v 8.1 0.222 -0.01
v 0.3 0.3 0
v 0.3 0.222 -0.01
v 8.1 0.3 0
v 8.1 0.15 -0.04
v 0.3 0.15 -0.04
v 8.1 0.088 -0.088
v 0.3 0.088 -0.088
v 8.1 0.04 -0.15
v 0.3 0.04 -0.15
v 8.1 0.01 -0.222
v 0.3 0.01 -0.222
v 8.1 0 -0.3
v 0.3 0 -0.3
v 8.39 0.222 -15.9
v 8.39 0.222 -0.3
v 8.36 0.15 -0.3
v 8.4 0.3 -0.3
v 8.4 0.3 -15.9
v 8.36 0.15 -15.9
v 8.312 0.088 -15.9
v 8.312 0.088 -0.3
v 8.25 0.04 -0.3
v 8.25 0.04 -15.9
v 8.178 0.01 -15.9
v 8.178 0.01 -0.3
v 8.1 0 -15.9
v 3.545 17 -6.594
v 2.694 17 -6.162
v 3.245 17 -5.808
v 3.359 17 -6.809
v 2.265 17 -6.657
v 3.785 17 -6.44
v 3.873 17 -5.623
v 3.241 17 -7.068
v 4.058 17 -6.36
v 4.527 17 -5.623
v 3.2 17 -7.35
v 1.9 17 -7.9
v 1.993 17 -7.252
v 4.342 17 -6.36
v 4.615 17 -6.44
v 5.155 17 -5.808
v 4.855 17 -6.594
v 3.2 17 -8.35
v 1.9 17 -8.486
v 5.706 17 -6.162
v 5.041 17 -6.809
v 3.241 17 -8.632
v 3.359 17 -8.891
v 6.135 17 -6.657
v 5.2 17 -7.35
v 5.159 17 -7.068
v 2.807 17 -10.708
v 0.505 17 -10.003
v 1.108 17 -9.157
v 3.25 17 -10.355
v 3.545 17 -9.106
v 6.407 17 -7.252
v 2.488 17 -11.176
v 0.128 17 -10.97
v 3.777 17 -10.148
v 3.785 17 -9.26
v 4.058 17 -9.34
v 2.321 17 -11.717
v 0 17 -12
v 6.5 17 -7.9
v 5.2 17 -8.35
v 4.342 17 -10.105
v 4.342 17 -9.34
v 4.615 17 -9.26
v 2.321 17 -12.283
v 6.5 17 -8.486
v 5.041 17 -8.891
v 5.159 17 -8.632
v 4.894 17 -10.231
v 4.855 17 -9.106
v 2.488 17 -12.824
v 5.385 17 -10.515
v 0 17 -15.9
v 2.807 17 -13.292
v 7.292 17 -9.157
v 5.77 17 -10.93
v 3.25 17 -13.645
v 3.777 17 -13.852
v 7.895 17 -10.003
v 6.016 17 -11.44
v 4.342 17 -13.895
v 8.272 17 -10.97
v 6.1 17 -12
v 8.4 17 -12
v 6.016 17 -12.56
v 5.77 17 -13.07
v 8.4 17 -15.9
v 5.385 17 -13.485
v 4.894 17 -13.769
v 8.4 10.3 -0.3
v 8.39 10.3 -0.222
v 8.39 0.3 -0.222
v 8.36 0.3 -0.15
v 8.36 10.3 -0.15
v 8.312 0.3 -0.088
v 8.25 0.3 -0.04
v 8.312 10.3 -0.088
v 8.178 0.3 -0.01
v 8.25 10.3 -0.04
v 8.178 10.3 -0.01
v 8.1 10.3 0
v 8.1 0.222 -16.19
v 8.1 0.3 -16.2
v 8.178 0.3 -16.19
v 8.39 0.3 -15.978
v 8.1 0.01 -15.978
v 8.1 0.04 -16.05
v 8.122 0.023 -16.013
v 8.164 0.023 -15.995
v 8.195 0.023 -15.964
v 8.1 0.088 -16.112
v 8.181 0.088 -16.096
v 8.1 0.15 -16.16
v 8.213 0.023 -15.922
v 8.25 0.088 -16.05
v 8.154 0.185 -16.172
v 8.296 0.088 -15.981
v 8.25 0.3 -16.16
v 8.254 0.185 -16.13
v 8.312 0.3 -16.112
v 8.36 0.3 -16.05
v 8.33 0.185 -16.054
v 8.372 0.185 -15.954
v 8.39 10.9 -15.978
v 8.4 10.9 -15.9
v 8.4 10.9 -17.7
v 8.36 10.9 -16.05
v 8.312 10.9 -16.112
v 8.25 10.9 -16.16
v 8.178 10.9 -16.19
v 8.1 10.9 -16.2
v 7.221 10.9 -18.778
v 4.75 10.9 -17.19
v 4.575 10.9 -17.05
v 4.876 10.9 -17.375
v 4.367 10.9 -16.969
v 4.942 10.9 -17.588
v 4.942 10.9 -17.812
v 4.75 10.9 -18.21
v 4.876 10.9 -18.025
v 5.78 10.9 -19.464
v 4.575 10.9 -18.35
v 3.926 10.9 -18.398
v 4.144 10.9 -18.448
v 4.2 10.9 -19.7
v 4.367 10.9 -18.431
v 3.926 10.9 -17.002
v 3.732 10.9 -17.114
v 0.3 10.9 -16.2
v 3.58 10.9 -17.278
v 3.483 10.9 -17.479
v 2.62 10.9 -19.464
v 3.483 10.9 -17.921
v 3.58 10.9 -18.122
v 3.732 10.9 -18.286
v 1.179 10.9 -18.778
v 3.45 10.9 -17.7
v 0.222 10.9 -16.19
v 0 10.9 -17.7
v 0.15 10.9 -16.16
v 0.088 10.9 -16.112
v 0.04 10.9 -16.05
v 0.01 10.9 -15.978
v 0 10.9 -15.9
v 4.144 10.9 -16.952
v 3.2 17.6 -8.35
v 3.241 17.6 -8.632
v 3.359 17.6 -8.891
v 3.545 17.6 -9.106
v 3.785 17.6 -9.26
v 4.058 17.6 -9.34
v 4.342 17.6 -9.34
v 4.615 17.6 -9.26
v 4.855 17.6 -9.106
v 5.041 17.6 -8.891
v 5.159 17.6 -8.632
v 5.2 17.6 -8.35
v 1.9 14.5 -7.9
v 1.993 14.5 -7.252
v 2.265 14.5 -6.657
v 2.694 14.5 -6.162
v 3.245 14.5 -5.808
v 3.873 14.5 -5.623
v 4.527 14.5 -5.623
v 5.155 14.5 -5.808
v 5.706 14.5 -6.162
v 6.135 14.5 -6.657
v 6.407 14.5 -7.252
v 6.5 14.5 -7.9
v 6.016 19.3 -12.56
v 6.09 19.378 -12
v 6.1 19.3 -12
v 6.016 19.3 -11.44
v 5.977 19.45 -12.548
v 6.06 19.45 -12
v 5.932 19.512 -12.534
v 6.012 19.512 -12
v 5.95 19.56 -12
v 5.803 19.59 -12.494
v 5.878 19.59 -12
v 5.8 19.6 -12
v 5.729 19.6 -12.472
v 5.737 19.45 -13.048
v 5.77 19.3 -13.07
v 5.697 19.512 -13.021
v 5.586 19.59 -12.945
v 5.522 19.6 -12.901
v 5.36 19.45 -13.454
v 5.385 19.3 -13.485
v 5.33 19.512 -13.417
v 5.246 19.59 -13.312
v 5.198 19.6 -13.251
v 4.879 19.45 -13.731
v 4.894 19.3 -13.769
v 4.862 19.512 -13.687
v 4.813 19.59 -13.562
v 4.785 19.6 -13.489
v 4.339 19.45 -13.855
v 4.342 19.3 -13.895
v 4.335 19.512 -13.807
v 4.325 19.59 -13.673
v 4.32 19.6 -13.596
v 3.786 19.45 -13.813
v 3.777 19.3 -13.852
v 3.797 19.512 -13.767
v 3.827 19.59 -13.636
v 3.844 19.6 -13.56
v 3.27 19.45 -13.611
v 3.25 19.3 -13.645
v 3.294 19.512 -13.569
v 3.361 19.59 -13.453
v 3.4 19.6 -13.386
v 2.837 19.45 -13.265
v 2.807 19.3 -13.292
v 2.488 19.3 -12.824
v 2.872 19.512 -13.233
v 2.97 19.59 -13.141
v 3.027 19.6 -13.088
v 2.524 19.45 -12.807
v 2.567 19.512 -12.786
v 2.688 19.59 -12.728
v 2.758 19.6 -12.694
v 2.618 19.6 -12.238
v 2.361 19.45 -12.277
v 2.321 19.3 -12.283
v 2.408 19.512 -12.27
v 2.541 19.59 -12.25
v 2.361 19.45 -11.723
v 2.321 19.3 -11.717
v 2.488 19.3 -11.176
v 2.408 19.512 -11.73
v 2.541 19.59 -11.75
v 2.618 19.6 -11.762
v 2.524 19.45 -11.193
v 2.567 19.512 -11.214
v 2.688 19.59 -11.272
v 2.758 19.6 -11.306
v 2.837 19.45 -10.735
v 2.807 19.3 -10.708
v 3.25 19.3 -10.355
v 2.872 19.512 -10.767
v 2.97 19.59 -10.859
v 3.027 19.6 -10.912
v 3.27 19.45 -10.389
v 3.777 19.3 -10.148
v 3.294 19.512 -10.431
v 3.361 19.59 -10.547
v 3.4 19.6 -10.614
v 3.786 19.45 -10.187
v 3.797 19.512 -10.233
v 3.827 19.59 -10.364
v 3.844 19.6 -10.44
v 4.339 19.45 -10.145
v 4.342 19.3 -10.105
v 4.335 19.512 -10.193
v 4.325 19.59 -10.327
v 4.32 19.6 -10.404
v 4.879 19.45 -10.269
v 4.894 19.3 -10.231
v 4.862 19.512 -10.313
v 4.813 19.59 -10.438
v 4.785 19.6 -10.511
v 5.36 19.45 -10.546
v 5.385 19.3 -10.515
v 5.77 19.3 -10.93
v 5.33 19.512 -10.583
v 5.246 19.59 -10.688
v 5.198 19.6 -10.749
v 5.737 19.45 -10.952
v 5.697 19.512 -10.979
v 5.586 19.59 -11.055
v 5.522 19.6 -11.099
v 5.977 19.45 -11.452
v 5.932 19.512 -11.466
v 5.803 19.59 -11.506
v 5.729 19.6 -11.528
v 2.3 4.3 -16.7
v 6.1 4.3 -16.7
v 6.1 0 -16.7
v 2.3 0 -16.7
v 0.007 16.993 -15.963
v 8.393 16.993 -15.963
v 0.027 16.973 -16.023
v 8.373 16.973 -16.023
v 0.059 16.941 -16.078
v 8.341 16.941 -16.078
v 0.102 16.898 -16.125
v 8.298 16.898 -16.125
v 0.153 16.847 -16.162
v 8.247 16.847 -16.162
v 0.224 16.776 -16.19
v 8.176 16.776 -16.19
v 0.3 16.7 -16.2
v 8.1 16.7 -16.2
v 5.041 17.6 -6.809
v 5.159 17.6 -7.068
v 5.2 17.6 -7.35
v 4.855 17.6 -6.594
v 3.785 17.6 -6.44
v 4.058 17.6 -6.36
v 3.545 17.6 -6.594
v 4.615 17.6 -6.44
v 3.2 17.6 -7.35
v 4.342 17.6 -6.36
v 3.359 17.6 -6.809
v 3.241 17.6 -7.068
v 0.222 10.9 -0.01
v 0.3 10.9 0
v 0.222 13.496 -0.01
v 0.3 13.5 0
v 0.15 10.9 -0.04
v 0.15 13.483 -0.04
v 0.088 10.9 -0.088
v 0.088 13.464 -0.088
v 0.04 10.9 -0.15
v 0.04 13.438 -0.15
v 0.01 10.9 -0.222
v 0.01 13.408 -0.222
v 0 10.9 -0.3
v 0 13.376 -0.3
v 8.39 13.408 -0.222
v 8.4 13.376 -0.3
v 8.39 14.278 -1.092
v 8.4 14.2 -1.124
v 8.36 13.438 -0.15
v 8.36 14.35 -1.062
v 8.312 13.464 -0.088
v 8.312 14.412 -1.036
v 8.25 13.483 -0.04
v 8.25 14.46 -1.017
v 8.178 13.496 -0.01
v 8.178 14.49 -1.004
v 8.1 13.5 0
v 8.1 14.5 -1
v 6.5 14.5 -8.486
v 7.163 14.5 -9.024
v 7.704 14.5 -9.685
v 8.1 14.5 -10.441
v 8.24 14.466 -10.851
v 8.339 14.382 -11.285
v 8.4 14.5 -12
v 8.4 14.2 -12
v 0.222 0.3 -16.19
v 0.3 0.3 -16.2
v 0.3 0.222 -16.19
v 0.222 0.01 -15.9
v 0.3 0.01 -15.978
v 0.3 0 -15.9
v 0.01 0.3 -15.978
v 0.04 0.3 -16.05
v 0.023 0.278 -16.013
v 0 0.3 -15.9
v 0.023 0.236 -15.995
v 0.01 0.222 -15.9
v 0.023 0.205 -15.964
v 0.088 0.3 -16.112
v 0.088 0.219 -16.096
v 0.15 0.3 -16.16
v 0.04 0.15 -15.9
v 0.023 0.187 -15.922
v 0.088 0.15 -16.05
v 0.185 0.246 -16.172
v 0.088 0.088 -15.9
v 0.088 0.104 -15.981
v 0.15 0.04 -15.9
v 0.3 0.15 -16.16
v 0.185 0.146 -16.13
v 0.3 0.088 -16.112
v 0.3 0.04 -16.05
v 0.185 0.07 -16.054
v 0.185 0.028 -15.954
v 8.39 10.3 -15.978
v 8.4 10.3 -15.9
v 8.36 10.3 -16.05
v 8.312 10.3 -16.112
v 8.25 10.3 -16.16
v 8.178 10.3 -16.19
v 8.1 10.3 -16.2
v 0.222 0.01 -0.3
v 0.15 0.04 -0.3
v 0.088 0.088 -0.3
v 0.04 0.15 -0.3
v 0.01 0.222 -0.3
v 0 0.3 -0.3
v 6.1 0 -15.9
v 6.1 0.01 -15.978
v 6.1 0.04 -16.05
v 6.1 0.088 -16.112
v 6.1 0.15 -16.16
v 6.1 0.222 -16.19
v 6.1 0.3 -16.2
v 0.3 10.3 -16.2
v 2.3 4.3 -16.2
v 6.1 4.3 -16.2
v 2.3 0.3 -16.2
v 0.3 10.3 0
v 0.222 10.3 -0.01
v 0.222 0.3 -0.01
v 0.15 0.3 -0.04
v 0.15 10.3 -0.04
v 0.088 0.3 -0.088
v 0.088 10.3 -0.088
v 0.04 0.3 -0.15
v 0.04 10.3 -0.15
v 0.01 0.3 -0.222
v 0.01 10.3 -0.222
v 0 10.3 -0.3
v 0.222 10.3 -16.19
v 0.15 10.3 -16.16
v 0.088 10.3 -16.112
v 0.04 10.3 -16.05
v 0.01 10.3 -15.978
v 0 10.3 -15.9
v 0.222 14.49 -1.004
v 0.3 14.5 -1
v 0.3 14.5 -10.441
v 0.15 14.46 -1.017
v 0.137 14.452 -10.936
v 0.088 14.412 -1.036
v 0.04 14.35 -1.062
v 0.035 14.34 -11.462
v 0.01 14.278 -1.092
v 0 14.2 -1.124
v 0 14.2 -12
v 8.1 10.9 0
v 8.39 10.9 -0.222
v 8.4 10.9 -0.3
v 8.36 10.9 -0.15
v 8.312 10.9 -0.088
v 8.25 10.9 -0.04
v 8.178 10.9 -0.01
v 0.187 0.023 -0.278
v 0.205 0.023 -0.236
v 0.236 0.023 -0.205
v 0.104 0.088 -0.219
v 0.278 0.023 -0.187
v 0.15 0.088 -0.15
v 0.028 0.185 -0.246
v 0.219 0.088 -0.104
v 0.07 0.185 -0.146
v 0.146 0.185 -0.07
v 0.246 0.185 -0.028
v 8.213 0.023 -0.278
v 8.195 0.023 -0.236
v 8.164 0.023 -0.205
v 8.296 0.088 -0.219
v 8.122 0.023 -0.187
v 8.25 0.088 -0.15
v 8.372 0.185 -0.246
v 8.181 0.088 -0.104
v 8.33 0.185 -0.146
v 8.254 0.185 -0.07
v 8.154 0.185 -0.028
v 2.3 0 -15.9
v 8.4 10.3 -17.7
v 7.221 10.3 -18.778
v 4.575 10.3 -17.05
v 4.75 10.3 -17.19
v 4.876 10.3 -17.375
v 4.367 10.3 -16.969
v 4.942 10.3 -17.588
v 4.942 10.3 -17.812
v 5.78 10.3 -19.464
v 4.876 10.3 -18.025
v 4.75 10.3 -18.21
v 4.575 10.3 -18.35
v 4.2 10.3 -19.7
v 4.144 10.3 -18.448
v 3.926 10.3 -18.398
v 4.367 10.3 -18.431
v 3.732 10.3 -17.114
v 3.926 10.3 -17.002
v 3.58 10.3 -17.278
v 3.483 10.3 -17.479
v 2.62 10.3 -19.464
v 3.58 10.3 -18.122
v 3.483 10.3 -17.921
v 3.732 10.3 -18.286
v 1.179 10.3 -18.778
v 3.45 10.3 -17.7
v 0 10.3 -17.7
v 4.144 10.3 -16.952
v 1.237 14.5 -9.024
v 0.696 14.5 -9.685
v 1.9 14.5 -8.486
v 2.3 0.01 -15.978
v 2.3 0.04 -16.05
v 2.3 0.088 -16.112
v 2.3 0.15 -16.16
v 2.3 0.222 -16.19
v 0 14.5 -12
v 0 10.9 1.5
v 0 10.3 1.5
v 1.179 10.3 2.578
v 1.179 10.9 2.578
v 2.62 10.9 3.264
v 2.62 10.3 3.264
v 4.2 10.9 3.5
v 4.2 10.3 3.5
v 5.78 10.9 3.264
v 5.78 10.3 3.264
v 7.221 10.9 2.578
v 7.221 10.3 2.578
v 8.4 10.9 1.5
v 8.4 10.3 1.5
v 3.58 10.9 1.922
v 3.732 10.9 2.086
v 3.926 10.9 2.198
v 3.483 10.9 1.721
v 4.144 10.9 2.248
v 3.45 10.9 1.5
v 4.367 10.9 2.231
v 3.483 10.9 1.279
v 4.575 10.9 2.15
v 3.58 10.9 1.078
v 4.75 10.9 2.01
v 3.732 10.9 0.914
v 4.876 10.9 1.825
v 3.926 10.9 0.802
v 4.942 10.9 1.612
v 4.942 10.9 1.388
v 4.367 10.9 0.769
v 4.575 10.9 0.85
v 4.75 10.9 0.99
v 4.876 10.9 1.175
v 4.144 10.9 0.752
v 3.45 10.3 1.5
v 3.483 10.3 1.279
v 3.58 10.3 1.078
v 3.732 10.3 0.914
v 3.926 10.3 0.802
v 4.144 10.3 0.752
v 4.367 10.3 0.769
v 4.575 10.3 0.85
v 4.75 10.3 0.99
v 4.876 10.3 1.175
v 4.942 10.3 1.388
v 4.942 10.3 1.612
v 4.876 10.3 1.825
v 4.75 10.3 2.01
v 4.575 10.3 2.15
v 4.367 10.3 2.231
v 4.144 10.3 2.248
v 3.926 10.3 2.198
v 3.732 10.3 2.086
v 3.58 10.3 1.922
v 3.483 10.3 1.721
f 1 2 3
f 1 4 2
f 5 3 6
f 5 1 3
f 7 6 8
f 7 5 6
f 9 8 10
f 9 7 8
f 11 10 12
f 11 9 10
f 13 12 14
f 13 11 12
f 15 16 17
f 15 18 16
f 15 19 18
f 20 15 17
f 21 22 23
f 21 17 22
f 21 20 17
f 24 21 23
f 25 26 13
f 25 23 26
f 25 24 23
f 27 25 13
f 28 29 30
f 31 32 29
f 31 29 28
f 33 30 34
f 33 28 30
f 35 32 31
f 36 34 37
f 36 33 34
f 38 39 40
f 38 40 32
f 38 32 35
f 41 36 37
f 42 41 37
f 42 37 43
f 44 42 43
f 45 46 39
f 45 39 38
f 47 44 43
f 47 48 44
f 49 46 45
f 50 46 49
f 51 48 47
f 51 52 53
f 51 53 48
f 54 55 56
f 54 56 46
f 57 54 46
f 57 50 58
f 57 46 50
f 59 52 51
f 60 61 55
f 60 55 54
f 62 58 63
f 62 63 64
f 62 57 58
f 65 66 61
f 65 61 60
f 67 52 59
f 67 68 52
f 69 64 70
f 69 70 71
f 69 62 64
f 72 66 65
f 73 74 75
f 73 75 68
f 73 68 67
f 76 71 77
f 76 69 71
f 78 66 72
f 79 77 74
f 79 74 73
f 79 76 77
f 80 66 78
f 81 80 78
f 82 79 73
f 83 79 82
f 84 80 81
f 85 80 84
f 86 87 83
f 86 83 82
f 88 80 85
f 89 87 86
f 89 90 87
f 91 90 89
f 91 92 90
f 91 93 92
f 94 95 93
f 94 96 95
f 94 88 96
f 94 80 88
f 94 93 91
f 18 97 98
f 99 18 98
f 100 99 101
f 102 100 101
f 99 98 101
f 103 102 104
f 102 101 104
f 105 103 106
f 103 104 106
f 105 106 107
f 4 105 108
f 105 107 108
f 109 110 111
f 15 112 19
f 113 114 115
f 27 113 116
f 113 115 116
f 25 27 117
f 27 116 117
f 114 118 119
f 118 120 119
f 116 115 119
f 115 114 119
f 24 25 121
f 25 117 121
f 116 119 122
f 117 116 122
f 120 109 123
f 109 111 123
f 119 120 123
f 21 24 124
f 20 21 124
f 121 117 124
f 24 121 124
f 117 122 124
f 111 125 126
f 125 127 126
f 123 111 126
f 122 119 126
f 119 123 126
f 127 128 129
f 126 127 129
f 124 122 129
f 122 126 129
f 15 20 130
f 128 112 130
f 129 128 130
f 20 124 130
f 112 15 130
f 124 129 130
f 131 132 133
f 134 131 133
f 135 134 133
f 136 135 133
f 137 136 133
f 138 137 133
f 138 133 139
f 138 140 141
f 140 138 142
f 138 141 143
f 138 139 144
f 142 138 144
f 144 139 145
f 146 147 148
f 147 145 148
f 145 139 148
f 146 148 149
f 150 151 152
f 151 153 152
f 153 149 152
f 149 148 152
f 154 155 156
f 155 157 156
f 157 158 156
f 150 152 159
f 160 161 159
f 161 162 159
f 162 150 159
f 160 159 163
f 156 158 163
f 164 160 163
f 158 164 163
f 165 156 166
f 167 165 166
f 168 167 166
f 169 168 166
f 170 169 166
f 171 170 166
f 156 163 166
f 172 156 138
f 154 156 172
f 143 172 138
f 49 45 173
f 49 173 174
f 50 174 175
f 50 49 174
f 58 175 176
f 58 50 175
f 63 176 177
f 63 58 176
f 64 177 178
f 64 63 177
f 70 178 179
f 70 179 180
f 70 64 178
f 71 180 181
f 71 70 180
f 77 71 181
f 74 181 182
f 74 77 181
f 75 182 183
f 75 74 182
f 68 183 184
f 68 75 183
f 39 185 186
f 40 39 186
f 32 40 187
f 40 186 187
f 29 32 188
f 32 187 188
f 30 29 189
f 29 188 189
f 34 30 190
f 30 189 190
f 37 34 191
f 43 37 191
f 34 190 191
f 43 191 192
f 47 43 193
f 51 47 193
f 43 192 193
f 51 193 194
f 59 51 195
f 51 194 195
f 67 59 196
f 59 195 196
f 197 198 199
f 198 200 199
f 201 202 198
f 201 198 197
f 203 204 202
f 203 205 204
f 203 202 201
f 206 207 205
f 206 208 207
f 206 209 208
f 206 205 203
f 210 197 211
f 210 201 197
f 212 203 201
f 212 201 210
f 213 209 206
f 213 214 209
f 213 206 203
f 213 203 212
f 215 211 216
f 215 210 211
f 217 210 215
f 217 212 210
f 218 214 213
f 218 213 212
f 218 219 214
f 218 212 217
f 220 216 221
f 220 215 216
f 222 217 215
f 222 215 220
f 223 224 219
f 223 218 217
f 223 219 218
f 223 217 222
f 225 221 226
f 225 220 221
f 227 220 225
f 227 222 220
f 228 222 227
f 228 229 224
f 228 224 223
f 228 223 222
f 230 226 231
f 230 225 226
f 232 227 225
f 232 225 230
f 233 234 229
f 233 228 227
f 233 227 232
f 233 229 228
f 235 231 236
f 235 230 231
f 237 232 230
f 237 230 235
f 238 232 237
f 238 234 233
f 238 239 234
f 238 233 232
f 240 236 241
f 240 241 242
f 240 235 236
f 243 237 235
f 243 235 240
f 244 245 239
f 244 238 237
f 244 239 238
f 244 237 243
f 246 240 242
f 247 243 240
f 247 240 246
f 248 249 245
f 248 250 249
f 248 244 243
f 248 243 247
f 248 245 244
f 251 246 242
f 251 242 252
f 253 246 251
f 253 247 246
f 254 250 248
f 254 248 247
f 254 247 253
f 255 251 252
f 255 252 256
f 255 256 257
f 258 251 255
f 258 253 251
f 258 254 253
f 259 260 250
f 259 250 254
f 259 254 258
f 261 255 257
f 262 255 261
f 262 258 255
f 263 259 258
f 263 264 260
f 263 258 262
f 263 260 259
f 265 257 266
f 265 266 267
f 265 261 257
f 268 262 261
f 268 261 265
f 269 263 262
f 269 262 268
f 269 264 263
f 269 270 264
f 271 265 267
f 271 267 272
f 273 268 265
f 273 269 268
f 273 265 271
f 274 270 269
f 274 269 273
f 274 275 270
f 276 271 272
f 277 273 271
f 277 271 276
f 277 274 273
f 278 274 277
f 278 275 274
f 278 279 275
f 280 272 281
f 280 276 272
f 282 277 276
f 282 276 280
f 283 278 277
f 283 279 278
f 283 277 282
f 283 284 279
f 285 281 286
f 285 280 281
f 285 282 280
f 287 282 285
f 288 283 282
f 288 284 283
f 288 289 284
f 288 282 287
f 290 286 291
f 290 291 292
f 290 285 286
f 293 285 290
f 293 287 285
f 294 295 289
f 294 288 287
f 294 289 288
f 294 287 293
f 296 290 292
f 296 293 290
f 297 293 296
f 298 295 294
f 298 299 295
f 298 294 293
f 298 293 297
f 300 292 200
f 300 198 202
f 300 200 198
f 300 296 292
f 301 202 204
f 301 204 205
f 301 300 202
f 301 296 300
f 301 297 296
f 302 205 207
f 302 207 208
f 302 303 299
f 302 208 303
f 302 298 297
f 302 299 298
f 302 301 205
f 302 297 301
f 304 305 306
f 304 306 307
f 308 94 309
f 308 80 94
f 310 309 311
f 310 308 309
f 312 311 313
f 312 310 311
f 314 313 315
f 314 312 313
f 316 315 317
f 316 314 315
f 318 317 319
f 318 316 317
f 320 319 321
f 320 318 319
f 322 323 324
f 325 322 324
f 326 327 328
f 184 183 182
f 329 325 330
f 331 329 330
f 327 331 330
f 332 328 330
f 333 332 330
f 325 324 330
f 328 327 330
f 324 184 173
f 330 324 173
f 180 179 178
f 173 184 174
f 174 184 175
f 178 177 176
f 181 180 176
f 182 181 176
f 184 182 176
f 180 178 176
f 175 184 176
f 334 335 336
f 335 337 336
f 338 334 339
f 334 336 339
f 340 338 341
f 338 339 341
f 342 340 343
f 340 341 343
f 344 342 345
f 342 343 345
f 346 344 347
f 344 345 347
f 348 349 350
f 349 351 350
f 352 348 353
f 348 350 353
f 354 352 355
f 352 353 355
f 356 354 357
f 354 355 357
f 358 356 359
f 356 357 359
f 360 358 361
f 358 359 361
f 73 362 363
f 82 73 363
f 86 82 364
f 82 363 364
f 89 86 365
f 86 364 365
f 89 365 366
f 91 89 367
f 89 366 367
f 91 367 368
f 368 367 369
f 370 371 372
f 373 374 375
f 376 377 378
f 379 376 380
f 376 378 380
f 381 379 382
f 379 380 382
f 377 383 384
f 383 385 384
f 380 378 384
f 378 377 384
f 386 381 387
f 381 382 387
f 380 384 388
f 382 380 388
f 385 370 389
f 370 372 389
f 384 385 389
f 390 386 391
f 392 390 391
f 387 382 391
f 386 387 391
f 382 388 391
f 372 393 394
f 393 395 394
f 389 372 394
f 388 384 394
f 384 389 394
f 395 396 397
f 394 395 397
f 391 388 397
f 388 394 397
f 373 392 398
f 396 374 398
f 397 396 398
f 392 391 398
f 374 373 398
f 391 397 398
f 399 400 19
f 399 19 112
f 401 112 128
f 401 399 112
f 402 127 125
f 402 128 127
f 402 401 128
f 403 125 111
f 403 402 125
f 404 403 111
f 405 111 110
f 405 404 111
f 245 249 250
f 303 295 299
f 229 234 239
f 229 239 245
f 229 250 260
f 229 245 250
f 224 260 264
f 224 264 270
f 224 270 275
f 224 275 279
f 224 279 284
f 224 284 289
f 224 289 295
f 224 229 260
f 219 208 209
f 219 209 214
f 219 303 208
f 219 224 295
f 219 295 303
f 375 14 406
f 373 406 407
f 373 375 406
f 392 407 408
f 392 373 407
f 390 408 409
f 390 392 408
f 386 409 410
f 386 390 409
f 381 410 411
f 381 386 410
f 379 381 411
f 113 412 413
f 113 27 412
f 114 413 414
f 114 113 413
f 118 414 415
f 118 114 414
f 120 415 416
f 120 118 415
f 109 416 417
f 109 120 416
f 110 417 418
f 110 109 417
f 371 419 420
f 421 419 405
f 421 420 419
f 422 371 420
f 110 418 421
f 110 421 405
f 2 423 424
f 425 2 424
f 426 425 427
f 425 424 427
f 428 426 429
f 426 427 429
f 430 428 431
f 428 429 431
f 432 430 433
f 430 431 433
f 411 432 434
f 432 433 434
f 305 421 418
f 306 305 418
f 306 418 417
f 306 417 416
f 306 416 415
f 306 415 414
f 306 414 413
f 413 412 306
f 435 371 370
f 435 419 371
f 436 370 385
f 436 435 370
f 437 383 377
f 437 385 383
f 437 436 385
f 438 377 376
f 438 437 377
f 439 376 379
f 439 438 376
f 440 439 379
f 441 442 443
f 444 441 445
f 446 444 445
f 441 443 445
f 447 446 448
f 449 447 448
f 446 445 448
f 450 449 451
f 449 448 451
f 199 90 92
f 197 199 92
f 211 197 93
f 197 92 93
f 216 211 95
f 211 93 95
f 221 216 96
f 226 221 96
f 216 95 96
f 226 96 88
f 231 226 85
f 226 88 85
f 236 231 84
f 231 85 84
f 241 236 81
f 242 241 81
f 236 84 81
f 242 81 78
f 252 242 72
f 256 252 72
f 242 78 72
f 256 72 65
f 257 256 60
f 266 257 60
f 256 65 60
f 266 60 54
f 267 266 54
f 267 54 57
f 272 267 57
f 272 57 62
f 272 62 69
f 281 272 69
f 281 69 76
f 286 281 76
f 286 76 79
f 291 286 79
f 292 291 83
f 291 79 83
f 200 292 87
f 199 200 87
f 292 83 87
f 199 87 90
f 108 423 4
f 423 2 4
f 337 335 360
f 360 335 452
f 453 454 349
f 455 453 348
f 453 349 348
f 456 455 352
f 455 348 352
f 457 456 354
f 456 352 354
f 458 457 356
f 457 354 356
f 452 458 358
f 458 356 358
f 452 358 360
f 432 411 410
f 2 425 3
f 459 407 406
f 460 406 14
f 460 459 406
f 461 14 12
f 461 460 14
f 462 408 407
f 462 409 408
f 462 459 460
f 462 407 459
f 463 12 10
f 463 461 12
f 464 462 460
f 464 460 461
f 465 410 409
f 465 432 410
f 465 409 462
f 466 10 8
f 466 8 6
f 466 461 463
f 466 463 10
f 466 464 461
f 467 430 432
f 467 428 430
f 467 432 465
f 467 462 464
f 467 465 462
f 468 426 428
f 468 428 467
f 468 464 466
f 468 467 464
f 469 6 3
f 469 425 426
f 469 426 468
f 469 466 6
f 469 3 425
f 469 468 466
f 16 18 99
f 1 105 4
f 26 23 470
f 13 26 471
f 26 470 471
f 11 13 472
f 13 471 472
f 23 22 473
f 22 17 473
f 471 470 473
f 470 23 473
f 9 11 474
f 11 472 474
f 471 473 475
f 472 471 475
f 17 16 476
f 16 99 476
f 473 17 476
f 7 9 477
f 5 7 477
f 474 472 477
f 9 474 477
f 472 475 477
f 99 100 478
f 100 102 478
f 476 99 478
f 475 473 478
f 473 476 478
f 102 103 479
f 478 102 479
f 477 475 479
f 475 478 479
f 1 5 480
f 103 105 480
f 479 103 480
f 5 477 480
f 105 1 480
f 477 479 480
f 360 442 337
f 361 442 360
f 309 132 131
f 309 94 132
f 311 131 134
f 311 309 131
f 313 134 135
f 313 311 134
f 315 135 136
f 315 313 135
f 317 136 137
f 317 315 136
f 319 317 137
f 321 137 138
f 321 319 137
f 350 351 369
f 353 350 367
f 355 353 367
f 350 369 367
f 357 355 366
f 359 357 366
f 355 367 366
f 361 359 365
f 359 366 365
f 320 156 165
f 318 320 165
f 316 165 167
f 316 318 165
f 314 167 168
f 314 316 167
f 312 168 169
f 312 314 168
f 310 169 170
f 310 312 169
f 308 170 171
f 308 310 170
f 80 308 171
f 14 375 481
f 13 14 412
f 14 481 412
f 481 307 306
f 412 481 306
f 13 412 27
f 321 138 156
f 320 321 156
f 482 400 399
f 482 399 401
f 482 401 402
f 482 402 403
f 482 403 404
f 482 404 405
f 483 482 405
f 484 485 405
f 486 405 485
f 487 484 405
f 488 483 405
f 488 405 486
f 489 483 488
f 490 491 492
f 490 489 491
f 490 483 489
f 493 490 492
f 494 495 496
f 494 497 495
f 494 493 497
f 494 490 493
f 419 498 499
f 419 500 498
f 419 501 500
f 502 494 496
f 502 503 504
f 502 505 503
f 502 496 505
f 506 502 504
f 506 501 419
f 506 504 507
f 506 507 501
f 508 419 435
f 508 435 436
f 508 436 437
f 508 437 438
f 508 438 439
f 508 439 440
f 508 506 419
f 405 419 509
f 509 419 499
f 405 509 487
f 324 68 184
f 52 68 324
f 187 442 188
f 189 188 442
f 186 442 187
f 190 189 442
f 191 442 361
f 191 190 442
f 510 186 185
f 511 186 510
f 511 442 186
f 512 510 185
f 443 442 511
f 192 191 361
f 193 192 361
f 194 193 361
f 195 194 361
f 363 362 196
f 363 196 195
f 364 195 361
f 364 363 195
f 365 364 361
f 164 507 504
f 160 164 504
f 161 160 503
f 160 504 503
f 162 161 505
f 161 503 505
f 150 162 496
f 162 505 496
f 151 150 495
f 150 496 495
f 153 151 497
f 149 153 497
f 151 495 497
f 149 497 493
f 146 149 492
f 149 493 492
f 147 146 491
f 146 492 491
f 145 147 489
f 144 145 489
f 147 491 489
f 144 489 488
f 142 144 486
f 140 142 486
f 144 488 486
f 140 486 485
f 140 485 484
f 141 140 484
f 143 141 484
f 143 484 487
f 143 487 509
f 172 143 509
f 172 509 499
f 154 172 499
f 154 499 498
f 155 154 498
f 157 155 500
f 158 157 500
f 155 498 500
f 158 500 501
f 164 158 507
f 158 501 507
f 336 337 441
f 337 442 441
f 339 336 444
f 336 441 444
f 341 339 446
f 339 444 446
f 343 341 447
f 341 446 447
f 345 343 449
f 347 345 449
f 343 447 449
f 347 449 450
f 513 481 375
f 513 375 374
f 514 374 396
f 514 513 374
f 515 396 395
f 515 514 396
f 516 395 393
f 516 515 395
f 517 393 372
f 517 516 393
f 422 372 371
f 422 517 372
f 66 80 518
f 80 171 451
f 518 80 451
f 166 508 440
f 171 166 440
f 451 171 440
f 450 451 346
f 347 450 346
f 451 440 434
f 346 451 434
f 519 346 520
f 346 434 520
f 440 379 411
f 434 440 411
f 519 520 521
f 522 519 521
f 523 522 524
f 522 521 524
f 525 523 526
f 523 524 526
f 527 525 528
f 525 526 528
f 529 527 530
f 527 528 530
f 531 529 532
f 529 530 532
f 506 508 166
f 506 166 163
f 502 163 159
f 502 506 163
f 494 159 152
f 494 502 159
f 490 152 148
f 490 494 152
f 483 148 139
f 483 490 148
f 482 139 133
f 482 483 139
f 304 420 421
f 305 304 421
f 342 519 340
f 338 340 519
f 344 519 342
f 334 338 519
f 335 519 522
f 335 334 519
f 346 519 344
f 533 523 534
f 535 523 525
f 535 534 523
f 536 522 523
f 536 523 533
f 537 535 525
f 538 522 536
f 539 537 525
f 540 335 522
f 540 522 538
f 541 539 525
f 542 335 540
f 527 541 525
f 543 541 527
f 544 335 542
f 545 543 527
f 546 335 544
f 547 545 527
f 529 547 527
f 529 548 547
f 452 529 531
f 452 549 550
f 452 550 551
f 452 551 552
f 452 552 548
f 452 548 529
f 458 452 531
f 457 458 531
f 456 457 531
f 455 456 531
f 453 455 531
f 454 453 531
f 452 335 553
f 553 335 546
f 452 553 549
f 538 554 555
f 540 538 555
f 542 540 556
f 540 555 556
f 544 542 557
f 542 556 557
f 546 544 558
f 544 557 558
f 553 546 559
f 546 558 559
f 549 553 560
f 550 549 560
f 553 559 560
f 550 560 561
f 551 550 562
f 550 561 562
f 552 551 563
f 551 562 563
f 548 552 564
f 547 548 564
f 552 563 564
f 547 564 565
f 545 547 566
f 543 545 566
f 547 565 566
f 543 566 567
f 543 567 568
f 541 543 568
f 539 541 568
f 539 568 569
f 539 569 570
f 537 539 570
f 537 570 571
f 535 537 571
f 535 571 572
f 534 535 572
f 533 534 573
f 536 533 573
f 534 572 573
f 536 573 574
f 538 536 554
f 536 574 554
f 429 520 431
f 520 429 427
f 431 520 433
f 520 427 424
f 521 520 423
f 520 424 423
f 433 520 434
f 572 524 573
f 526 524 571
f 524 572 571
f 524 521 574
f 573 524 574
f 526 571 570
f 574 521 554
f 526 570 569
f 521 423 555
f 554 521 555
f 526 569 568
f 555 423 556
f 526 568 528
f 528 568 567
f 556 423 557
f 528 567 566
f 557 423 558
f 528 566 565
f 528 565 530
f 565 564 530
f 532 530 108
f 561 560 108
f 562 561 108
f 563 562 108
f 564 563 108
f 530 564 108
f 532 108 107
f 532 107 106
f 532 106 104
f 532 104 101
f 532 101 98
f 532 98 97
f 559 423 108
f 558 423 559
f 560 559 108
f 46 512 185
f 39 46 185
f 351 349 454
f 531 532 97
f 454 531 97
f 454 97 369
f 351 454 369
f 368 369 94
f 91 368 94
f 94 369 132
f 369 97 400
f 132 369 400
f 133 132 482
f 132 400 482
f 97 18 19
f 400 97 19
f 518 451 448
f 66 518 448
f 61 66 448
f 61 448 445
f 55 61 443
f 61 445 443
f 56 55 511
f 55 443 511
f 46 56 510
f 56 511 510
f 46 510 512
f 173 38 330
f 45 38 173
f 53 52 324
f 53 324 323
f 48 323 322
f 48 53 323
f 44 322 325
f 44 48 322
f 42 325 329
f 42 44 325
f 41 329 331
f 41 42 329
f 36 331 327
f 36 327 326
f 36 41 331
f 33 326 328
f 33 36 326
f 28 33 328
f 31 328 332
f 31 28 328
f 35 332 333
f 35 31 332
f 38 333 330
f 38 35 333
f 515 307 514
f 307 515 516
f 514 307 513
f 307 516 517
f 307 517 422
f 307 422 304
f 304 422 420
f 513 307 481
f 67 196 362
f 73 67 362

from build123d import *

# Parameters (mm, degrees)
SKETCH_1_W      = 8.4
SKETCH_1_H      = 16.2
EXTRUDE_1_DEPTH = 14.5
SKETCH_3_R      = 0.75
EXTRUDE_2_DEPTH = 0.6
EXTRUDE_3_DEPTH = 2.5
SKETCH_5_R      = 1.9
EXTRUDE_4_DEPTH = 2.6
EXTRUDE_5_DEPTH = 0.6
EXTRUDE_6_DEPTH = 0.5
CHAMFER_1_SIZE  = 1
FILLET_1_R      = 0.3


with BuildPart() as part:
    # 草图1 → 凸台-拉伸1 (new body)
    with BuildSketch(Plane(origin=(0, 0, 0), x_dir=(1, 0, 0), z_dir=(0, 1, 0))):
        with Locations((4.2, 8.1)):
            Rectangle(SKETCH_1_W, SKETCH_1_H)
    extrude(amount=EXTRUDE_1_DEPTH)

    # 草图3 → 凸台-拉伸2 (add)
    with BuildSketch(Plane(origin=(0, 10.3, 0), x_dir=(-1, 0, 0), z_dir=(0, -1, 0))):
        with BuildLine():
            Line((0, 16.2), (0, 17.7))
            ThreePointArc((0, 17.7), (-4.2, 19.7), (-8.4, 17.7))
            Line((-8.4, 17.7), (-8.4, 16.2))
            Line((-8.4, 16.2), (0, 16.2))
        make_face()
        with Locations((-4.2, 17.7)):
            Circle(SKETCH_3_R, mode=Mode.SUBTRACT)
        with BuildLine():
            Line((-8.4, 0), (0, 0))
            Line((0, 0), (0, -1.5))
            ThreePointArc((0, -1.5), (-4.2, -3.5), (-8.4, -1.5))
            Line((-8.4, -1.5), (-8.4, 0))
        make_face()
        with Locations((-4.2, -1.5)):
            Circle(SKETCH_3_R, mode=Mode.SUBTRACT)
    extrude(amount=-EXTRUDE_2_DEPTH)

    # 草图4 → 凸台-拉伸3 (add)
    with BuildSketch(Plane(origin=(0, 14.5, 0), x_dir=(1, 0, 0), z_dir=(0, 1, 0))):
        with BuildLine():
            Line((8.4, 12), (8.4, 16.2))
            Line((8.4, 16.2), (0, 16.2))
            Line((0, 16.2), (0, 12))
            ThreePointArc((0, 12), (0.50540936, 10.002501564), (1.9, 8.485743322))
            Line((1.9, 8.485743322), (1.9, 7.9))
            ThreePointArc((1.9, 7.9), (4.2, 5.6), (6.5, 7.9))
            Line((6.5, 7.9), (6.5, 8.485743322))
            ThreePointArc((6.5, 8.485743322), (7.89459064, 10.002501564), (8.4, 12))
        make_face()
    extrude(amount=EXTRUDE_3_DEPTH)

    # 草图5 → 凸台-拉伸4 (add)
    with BuildSketch(Plane(origin=(0, 17, 0), x_dir=(1, 0, 0), z_dir=(0, 1, 0))):
        with Locations((4.2, 12)):
            Circle(SKETCH_5_R)
    extrude(amount=EXTRUDE_4_DEPTH)

    # 草图6 → 凸台-拉伸5 (add)
    with BuildSketch(Plane(origin=(0, 17, 0), x_dir=(1, 0, 0), z_dir=(0, 1, 0))):
        with BuildLine():
            Line((5.2, 8.35), (5.2, 7.35))
            ThreePointArc((5.2, 7.35), (4.2, 6.35), (3.2, 7.35))
            Line((3.2, 7.35), (3.2, 8.35))
            ThreePointArc((3.2, 8.35), (4.2, 9.35), (5.2, 8.35))
        make_face()
    extrude(amount=EXTRUDE_5_DEPTH)

    # 草图7 → 凸台-拉伸6 (add)
    with BuildSketch(Plane(origin=(0, 0, -16.2), x_dir=(-1, 0, 0), z_dir=(0, 0, -1))):
        Polygon((-4.2, 4.3), (-6.1, 4.3), (-6.1, 0), (-2.3, 0), (-2.3, 4.3), align=None)
    extrude(amount=EXTRUDE_6_DEPTH)

    # 倒角1
    chamfer_1_edges = [part.edges().sort_by_distance(p)[0] for p in [
        (4.2, 14.5, 0),
    ]]
    chamfer(chamfer_1_edges, length=CHAMFER_1_SIZE)

    # 圆角1
    fillet_1_edges = [part.edges().sort_by_distance(p)[0] for p in [
        (1.15, 0, -16.2),
        (8.4, 14.5, -6.5),
        (8.4, 12.2, 0),
        (8.4, 14, -0.5),
        (0, 12.2, 0),
        (0, 14, -0.5),
        (0, 5.15, -16.2),
        (8.4, 5.15, -16.2),
        (8.4, 5.15, 0),
        (0, 5.15, 0),
        (0, 14.5, -6.5),
        (0, 0, -8.1),
        (4.2, 17, -16.2),
        (7.25, 0, -16.2),
        (8.4, 0, -8.1),
        (4.2, 0, 0),
        (2.3, 19.6, -12),
        (0, 13.95, -16.2),
        (8.4, 13.95, -16.2),
    ]]
    fillet(fillet_1_edges, radius=FILLET_1_R)


solid = part.part
